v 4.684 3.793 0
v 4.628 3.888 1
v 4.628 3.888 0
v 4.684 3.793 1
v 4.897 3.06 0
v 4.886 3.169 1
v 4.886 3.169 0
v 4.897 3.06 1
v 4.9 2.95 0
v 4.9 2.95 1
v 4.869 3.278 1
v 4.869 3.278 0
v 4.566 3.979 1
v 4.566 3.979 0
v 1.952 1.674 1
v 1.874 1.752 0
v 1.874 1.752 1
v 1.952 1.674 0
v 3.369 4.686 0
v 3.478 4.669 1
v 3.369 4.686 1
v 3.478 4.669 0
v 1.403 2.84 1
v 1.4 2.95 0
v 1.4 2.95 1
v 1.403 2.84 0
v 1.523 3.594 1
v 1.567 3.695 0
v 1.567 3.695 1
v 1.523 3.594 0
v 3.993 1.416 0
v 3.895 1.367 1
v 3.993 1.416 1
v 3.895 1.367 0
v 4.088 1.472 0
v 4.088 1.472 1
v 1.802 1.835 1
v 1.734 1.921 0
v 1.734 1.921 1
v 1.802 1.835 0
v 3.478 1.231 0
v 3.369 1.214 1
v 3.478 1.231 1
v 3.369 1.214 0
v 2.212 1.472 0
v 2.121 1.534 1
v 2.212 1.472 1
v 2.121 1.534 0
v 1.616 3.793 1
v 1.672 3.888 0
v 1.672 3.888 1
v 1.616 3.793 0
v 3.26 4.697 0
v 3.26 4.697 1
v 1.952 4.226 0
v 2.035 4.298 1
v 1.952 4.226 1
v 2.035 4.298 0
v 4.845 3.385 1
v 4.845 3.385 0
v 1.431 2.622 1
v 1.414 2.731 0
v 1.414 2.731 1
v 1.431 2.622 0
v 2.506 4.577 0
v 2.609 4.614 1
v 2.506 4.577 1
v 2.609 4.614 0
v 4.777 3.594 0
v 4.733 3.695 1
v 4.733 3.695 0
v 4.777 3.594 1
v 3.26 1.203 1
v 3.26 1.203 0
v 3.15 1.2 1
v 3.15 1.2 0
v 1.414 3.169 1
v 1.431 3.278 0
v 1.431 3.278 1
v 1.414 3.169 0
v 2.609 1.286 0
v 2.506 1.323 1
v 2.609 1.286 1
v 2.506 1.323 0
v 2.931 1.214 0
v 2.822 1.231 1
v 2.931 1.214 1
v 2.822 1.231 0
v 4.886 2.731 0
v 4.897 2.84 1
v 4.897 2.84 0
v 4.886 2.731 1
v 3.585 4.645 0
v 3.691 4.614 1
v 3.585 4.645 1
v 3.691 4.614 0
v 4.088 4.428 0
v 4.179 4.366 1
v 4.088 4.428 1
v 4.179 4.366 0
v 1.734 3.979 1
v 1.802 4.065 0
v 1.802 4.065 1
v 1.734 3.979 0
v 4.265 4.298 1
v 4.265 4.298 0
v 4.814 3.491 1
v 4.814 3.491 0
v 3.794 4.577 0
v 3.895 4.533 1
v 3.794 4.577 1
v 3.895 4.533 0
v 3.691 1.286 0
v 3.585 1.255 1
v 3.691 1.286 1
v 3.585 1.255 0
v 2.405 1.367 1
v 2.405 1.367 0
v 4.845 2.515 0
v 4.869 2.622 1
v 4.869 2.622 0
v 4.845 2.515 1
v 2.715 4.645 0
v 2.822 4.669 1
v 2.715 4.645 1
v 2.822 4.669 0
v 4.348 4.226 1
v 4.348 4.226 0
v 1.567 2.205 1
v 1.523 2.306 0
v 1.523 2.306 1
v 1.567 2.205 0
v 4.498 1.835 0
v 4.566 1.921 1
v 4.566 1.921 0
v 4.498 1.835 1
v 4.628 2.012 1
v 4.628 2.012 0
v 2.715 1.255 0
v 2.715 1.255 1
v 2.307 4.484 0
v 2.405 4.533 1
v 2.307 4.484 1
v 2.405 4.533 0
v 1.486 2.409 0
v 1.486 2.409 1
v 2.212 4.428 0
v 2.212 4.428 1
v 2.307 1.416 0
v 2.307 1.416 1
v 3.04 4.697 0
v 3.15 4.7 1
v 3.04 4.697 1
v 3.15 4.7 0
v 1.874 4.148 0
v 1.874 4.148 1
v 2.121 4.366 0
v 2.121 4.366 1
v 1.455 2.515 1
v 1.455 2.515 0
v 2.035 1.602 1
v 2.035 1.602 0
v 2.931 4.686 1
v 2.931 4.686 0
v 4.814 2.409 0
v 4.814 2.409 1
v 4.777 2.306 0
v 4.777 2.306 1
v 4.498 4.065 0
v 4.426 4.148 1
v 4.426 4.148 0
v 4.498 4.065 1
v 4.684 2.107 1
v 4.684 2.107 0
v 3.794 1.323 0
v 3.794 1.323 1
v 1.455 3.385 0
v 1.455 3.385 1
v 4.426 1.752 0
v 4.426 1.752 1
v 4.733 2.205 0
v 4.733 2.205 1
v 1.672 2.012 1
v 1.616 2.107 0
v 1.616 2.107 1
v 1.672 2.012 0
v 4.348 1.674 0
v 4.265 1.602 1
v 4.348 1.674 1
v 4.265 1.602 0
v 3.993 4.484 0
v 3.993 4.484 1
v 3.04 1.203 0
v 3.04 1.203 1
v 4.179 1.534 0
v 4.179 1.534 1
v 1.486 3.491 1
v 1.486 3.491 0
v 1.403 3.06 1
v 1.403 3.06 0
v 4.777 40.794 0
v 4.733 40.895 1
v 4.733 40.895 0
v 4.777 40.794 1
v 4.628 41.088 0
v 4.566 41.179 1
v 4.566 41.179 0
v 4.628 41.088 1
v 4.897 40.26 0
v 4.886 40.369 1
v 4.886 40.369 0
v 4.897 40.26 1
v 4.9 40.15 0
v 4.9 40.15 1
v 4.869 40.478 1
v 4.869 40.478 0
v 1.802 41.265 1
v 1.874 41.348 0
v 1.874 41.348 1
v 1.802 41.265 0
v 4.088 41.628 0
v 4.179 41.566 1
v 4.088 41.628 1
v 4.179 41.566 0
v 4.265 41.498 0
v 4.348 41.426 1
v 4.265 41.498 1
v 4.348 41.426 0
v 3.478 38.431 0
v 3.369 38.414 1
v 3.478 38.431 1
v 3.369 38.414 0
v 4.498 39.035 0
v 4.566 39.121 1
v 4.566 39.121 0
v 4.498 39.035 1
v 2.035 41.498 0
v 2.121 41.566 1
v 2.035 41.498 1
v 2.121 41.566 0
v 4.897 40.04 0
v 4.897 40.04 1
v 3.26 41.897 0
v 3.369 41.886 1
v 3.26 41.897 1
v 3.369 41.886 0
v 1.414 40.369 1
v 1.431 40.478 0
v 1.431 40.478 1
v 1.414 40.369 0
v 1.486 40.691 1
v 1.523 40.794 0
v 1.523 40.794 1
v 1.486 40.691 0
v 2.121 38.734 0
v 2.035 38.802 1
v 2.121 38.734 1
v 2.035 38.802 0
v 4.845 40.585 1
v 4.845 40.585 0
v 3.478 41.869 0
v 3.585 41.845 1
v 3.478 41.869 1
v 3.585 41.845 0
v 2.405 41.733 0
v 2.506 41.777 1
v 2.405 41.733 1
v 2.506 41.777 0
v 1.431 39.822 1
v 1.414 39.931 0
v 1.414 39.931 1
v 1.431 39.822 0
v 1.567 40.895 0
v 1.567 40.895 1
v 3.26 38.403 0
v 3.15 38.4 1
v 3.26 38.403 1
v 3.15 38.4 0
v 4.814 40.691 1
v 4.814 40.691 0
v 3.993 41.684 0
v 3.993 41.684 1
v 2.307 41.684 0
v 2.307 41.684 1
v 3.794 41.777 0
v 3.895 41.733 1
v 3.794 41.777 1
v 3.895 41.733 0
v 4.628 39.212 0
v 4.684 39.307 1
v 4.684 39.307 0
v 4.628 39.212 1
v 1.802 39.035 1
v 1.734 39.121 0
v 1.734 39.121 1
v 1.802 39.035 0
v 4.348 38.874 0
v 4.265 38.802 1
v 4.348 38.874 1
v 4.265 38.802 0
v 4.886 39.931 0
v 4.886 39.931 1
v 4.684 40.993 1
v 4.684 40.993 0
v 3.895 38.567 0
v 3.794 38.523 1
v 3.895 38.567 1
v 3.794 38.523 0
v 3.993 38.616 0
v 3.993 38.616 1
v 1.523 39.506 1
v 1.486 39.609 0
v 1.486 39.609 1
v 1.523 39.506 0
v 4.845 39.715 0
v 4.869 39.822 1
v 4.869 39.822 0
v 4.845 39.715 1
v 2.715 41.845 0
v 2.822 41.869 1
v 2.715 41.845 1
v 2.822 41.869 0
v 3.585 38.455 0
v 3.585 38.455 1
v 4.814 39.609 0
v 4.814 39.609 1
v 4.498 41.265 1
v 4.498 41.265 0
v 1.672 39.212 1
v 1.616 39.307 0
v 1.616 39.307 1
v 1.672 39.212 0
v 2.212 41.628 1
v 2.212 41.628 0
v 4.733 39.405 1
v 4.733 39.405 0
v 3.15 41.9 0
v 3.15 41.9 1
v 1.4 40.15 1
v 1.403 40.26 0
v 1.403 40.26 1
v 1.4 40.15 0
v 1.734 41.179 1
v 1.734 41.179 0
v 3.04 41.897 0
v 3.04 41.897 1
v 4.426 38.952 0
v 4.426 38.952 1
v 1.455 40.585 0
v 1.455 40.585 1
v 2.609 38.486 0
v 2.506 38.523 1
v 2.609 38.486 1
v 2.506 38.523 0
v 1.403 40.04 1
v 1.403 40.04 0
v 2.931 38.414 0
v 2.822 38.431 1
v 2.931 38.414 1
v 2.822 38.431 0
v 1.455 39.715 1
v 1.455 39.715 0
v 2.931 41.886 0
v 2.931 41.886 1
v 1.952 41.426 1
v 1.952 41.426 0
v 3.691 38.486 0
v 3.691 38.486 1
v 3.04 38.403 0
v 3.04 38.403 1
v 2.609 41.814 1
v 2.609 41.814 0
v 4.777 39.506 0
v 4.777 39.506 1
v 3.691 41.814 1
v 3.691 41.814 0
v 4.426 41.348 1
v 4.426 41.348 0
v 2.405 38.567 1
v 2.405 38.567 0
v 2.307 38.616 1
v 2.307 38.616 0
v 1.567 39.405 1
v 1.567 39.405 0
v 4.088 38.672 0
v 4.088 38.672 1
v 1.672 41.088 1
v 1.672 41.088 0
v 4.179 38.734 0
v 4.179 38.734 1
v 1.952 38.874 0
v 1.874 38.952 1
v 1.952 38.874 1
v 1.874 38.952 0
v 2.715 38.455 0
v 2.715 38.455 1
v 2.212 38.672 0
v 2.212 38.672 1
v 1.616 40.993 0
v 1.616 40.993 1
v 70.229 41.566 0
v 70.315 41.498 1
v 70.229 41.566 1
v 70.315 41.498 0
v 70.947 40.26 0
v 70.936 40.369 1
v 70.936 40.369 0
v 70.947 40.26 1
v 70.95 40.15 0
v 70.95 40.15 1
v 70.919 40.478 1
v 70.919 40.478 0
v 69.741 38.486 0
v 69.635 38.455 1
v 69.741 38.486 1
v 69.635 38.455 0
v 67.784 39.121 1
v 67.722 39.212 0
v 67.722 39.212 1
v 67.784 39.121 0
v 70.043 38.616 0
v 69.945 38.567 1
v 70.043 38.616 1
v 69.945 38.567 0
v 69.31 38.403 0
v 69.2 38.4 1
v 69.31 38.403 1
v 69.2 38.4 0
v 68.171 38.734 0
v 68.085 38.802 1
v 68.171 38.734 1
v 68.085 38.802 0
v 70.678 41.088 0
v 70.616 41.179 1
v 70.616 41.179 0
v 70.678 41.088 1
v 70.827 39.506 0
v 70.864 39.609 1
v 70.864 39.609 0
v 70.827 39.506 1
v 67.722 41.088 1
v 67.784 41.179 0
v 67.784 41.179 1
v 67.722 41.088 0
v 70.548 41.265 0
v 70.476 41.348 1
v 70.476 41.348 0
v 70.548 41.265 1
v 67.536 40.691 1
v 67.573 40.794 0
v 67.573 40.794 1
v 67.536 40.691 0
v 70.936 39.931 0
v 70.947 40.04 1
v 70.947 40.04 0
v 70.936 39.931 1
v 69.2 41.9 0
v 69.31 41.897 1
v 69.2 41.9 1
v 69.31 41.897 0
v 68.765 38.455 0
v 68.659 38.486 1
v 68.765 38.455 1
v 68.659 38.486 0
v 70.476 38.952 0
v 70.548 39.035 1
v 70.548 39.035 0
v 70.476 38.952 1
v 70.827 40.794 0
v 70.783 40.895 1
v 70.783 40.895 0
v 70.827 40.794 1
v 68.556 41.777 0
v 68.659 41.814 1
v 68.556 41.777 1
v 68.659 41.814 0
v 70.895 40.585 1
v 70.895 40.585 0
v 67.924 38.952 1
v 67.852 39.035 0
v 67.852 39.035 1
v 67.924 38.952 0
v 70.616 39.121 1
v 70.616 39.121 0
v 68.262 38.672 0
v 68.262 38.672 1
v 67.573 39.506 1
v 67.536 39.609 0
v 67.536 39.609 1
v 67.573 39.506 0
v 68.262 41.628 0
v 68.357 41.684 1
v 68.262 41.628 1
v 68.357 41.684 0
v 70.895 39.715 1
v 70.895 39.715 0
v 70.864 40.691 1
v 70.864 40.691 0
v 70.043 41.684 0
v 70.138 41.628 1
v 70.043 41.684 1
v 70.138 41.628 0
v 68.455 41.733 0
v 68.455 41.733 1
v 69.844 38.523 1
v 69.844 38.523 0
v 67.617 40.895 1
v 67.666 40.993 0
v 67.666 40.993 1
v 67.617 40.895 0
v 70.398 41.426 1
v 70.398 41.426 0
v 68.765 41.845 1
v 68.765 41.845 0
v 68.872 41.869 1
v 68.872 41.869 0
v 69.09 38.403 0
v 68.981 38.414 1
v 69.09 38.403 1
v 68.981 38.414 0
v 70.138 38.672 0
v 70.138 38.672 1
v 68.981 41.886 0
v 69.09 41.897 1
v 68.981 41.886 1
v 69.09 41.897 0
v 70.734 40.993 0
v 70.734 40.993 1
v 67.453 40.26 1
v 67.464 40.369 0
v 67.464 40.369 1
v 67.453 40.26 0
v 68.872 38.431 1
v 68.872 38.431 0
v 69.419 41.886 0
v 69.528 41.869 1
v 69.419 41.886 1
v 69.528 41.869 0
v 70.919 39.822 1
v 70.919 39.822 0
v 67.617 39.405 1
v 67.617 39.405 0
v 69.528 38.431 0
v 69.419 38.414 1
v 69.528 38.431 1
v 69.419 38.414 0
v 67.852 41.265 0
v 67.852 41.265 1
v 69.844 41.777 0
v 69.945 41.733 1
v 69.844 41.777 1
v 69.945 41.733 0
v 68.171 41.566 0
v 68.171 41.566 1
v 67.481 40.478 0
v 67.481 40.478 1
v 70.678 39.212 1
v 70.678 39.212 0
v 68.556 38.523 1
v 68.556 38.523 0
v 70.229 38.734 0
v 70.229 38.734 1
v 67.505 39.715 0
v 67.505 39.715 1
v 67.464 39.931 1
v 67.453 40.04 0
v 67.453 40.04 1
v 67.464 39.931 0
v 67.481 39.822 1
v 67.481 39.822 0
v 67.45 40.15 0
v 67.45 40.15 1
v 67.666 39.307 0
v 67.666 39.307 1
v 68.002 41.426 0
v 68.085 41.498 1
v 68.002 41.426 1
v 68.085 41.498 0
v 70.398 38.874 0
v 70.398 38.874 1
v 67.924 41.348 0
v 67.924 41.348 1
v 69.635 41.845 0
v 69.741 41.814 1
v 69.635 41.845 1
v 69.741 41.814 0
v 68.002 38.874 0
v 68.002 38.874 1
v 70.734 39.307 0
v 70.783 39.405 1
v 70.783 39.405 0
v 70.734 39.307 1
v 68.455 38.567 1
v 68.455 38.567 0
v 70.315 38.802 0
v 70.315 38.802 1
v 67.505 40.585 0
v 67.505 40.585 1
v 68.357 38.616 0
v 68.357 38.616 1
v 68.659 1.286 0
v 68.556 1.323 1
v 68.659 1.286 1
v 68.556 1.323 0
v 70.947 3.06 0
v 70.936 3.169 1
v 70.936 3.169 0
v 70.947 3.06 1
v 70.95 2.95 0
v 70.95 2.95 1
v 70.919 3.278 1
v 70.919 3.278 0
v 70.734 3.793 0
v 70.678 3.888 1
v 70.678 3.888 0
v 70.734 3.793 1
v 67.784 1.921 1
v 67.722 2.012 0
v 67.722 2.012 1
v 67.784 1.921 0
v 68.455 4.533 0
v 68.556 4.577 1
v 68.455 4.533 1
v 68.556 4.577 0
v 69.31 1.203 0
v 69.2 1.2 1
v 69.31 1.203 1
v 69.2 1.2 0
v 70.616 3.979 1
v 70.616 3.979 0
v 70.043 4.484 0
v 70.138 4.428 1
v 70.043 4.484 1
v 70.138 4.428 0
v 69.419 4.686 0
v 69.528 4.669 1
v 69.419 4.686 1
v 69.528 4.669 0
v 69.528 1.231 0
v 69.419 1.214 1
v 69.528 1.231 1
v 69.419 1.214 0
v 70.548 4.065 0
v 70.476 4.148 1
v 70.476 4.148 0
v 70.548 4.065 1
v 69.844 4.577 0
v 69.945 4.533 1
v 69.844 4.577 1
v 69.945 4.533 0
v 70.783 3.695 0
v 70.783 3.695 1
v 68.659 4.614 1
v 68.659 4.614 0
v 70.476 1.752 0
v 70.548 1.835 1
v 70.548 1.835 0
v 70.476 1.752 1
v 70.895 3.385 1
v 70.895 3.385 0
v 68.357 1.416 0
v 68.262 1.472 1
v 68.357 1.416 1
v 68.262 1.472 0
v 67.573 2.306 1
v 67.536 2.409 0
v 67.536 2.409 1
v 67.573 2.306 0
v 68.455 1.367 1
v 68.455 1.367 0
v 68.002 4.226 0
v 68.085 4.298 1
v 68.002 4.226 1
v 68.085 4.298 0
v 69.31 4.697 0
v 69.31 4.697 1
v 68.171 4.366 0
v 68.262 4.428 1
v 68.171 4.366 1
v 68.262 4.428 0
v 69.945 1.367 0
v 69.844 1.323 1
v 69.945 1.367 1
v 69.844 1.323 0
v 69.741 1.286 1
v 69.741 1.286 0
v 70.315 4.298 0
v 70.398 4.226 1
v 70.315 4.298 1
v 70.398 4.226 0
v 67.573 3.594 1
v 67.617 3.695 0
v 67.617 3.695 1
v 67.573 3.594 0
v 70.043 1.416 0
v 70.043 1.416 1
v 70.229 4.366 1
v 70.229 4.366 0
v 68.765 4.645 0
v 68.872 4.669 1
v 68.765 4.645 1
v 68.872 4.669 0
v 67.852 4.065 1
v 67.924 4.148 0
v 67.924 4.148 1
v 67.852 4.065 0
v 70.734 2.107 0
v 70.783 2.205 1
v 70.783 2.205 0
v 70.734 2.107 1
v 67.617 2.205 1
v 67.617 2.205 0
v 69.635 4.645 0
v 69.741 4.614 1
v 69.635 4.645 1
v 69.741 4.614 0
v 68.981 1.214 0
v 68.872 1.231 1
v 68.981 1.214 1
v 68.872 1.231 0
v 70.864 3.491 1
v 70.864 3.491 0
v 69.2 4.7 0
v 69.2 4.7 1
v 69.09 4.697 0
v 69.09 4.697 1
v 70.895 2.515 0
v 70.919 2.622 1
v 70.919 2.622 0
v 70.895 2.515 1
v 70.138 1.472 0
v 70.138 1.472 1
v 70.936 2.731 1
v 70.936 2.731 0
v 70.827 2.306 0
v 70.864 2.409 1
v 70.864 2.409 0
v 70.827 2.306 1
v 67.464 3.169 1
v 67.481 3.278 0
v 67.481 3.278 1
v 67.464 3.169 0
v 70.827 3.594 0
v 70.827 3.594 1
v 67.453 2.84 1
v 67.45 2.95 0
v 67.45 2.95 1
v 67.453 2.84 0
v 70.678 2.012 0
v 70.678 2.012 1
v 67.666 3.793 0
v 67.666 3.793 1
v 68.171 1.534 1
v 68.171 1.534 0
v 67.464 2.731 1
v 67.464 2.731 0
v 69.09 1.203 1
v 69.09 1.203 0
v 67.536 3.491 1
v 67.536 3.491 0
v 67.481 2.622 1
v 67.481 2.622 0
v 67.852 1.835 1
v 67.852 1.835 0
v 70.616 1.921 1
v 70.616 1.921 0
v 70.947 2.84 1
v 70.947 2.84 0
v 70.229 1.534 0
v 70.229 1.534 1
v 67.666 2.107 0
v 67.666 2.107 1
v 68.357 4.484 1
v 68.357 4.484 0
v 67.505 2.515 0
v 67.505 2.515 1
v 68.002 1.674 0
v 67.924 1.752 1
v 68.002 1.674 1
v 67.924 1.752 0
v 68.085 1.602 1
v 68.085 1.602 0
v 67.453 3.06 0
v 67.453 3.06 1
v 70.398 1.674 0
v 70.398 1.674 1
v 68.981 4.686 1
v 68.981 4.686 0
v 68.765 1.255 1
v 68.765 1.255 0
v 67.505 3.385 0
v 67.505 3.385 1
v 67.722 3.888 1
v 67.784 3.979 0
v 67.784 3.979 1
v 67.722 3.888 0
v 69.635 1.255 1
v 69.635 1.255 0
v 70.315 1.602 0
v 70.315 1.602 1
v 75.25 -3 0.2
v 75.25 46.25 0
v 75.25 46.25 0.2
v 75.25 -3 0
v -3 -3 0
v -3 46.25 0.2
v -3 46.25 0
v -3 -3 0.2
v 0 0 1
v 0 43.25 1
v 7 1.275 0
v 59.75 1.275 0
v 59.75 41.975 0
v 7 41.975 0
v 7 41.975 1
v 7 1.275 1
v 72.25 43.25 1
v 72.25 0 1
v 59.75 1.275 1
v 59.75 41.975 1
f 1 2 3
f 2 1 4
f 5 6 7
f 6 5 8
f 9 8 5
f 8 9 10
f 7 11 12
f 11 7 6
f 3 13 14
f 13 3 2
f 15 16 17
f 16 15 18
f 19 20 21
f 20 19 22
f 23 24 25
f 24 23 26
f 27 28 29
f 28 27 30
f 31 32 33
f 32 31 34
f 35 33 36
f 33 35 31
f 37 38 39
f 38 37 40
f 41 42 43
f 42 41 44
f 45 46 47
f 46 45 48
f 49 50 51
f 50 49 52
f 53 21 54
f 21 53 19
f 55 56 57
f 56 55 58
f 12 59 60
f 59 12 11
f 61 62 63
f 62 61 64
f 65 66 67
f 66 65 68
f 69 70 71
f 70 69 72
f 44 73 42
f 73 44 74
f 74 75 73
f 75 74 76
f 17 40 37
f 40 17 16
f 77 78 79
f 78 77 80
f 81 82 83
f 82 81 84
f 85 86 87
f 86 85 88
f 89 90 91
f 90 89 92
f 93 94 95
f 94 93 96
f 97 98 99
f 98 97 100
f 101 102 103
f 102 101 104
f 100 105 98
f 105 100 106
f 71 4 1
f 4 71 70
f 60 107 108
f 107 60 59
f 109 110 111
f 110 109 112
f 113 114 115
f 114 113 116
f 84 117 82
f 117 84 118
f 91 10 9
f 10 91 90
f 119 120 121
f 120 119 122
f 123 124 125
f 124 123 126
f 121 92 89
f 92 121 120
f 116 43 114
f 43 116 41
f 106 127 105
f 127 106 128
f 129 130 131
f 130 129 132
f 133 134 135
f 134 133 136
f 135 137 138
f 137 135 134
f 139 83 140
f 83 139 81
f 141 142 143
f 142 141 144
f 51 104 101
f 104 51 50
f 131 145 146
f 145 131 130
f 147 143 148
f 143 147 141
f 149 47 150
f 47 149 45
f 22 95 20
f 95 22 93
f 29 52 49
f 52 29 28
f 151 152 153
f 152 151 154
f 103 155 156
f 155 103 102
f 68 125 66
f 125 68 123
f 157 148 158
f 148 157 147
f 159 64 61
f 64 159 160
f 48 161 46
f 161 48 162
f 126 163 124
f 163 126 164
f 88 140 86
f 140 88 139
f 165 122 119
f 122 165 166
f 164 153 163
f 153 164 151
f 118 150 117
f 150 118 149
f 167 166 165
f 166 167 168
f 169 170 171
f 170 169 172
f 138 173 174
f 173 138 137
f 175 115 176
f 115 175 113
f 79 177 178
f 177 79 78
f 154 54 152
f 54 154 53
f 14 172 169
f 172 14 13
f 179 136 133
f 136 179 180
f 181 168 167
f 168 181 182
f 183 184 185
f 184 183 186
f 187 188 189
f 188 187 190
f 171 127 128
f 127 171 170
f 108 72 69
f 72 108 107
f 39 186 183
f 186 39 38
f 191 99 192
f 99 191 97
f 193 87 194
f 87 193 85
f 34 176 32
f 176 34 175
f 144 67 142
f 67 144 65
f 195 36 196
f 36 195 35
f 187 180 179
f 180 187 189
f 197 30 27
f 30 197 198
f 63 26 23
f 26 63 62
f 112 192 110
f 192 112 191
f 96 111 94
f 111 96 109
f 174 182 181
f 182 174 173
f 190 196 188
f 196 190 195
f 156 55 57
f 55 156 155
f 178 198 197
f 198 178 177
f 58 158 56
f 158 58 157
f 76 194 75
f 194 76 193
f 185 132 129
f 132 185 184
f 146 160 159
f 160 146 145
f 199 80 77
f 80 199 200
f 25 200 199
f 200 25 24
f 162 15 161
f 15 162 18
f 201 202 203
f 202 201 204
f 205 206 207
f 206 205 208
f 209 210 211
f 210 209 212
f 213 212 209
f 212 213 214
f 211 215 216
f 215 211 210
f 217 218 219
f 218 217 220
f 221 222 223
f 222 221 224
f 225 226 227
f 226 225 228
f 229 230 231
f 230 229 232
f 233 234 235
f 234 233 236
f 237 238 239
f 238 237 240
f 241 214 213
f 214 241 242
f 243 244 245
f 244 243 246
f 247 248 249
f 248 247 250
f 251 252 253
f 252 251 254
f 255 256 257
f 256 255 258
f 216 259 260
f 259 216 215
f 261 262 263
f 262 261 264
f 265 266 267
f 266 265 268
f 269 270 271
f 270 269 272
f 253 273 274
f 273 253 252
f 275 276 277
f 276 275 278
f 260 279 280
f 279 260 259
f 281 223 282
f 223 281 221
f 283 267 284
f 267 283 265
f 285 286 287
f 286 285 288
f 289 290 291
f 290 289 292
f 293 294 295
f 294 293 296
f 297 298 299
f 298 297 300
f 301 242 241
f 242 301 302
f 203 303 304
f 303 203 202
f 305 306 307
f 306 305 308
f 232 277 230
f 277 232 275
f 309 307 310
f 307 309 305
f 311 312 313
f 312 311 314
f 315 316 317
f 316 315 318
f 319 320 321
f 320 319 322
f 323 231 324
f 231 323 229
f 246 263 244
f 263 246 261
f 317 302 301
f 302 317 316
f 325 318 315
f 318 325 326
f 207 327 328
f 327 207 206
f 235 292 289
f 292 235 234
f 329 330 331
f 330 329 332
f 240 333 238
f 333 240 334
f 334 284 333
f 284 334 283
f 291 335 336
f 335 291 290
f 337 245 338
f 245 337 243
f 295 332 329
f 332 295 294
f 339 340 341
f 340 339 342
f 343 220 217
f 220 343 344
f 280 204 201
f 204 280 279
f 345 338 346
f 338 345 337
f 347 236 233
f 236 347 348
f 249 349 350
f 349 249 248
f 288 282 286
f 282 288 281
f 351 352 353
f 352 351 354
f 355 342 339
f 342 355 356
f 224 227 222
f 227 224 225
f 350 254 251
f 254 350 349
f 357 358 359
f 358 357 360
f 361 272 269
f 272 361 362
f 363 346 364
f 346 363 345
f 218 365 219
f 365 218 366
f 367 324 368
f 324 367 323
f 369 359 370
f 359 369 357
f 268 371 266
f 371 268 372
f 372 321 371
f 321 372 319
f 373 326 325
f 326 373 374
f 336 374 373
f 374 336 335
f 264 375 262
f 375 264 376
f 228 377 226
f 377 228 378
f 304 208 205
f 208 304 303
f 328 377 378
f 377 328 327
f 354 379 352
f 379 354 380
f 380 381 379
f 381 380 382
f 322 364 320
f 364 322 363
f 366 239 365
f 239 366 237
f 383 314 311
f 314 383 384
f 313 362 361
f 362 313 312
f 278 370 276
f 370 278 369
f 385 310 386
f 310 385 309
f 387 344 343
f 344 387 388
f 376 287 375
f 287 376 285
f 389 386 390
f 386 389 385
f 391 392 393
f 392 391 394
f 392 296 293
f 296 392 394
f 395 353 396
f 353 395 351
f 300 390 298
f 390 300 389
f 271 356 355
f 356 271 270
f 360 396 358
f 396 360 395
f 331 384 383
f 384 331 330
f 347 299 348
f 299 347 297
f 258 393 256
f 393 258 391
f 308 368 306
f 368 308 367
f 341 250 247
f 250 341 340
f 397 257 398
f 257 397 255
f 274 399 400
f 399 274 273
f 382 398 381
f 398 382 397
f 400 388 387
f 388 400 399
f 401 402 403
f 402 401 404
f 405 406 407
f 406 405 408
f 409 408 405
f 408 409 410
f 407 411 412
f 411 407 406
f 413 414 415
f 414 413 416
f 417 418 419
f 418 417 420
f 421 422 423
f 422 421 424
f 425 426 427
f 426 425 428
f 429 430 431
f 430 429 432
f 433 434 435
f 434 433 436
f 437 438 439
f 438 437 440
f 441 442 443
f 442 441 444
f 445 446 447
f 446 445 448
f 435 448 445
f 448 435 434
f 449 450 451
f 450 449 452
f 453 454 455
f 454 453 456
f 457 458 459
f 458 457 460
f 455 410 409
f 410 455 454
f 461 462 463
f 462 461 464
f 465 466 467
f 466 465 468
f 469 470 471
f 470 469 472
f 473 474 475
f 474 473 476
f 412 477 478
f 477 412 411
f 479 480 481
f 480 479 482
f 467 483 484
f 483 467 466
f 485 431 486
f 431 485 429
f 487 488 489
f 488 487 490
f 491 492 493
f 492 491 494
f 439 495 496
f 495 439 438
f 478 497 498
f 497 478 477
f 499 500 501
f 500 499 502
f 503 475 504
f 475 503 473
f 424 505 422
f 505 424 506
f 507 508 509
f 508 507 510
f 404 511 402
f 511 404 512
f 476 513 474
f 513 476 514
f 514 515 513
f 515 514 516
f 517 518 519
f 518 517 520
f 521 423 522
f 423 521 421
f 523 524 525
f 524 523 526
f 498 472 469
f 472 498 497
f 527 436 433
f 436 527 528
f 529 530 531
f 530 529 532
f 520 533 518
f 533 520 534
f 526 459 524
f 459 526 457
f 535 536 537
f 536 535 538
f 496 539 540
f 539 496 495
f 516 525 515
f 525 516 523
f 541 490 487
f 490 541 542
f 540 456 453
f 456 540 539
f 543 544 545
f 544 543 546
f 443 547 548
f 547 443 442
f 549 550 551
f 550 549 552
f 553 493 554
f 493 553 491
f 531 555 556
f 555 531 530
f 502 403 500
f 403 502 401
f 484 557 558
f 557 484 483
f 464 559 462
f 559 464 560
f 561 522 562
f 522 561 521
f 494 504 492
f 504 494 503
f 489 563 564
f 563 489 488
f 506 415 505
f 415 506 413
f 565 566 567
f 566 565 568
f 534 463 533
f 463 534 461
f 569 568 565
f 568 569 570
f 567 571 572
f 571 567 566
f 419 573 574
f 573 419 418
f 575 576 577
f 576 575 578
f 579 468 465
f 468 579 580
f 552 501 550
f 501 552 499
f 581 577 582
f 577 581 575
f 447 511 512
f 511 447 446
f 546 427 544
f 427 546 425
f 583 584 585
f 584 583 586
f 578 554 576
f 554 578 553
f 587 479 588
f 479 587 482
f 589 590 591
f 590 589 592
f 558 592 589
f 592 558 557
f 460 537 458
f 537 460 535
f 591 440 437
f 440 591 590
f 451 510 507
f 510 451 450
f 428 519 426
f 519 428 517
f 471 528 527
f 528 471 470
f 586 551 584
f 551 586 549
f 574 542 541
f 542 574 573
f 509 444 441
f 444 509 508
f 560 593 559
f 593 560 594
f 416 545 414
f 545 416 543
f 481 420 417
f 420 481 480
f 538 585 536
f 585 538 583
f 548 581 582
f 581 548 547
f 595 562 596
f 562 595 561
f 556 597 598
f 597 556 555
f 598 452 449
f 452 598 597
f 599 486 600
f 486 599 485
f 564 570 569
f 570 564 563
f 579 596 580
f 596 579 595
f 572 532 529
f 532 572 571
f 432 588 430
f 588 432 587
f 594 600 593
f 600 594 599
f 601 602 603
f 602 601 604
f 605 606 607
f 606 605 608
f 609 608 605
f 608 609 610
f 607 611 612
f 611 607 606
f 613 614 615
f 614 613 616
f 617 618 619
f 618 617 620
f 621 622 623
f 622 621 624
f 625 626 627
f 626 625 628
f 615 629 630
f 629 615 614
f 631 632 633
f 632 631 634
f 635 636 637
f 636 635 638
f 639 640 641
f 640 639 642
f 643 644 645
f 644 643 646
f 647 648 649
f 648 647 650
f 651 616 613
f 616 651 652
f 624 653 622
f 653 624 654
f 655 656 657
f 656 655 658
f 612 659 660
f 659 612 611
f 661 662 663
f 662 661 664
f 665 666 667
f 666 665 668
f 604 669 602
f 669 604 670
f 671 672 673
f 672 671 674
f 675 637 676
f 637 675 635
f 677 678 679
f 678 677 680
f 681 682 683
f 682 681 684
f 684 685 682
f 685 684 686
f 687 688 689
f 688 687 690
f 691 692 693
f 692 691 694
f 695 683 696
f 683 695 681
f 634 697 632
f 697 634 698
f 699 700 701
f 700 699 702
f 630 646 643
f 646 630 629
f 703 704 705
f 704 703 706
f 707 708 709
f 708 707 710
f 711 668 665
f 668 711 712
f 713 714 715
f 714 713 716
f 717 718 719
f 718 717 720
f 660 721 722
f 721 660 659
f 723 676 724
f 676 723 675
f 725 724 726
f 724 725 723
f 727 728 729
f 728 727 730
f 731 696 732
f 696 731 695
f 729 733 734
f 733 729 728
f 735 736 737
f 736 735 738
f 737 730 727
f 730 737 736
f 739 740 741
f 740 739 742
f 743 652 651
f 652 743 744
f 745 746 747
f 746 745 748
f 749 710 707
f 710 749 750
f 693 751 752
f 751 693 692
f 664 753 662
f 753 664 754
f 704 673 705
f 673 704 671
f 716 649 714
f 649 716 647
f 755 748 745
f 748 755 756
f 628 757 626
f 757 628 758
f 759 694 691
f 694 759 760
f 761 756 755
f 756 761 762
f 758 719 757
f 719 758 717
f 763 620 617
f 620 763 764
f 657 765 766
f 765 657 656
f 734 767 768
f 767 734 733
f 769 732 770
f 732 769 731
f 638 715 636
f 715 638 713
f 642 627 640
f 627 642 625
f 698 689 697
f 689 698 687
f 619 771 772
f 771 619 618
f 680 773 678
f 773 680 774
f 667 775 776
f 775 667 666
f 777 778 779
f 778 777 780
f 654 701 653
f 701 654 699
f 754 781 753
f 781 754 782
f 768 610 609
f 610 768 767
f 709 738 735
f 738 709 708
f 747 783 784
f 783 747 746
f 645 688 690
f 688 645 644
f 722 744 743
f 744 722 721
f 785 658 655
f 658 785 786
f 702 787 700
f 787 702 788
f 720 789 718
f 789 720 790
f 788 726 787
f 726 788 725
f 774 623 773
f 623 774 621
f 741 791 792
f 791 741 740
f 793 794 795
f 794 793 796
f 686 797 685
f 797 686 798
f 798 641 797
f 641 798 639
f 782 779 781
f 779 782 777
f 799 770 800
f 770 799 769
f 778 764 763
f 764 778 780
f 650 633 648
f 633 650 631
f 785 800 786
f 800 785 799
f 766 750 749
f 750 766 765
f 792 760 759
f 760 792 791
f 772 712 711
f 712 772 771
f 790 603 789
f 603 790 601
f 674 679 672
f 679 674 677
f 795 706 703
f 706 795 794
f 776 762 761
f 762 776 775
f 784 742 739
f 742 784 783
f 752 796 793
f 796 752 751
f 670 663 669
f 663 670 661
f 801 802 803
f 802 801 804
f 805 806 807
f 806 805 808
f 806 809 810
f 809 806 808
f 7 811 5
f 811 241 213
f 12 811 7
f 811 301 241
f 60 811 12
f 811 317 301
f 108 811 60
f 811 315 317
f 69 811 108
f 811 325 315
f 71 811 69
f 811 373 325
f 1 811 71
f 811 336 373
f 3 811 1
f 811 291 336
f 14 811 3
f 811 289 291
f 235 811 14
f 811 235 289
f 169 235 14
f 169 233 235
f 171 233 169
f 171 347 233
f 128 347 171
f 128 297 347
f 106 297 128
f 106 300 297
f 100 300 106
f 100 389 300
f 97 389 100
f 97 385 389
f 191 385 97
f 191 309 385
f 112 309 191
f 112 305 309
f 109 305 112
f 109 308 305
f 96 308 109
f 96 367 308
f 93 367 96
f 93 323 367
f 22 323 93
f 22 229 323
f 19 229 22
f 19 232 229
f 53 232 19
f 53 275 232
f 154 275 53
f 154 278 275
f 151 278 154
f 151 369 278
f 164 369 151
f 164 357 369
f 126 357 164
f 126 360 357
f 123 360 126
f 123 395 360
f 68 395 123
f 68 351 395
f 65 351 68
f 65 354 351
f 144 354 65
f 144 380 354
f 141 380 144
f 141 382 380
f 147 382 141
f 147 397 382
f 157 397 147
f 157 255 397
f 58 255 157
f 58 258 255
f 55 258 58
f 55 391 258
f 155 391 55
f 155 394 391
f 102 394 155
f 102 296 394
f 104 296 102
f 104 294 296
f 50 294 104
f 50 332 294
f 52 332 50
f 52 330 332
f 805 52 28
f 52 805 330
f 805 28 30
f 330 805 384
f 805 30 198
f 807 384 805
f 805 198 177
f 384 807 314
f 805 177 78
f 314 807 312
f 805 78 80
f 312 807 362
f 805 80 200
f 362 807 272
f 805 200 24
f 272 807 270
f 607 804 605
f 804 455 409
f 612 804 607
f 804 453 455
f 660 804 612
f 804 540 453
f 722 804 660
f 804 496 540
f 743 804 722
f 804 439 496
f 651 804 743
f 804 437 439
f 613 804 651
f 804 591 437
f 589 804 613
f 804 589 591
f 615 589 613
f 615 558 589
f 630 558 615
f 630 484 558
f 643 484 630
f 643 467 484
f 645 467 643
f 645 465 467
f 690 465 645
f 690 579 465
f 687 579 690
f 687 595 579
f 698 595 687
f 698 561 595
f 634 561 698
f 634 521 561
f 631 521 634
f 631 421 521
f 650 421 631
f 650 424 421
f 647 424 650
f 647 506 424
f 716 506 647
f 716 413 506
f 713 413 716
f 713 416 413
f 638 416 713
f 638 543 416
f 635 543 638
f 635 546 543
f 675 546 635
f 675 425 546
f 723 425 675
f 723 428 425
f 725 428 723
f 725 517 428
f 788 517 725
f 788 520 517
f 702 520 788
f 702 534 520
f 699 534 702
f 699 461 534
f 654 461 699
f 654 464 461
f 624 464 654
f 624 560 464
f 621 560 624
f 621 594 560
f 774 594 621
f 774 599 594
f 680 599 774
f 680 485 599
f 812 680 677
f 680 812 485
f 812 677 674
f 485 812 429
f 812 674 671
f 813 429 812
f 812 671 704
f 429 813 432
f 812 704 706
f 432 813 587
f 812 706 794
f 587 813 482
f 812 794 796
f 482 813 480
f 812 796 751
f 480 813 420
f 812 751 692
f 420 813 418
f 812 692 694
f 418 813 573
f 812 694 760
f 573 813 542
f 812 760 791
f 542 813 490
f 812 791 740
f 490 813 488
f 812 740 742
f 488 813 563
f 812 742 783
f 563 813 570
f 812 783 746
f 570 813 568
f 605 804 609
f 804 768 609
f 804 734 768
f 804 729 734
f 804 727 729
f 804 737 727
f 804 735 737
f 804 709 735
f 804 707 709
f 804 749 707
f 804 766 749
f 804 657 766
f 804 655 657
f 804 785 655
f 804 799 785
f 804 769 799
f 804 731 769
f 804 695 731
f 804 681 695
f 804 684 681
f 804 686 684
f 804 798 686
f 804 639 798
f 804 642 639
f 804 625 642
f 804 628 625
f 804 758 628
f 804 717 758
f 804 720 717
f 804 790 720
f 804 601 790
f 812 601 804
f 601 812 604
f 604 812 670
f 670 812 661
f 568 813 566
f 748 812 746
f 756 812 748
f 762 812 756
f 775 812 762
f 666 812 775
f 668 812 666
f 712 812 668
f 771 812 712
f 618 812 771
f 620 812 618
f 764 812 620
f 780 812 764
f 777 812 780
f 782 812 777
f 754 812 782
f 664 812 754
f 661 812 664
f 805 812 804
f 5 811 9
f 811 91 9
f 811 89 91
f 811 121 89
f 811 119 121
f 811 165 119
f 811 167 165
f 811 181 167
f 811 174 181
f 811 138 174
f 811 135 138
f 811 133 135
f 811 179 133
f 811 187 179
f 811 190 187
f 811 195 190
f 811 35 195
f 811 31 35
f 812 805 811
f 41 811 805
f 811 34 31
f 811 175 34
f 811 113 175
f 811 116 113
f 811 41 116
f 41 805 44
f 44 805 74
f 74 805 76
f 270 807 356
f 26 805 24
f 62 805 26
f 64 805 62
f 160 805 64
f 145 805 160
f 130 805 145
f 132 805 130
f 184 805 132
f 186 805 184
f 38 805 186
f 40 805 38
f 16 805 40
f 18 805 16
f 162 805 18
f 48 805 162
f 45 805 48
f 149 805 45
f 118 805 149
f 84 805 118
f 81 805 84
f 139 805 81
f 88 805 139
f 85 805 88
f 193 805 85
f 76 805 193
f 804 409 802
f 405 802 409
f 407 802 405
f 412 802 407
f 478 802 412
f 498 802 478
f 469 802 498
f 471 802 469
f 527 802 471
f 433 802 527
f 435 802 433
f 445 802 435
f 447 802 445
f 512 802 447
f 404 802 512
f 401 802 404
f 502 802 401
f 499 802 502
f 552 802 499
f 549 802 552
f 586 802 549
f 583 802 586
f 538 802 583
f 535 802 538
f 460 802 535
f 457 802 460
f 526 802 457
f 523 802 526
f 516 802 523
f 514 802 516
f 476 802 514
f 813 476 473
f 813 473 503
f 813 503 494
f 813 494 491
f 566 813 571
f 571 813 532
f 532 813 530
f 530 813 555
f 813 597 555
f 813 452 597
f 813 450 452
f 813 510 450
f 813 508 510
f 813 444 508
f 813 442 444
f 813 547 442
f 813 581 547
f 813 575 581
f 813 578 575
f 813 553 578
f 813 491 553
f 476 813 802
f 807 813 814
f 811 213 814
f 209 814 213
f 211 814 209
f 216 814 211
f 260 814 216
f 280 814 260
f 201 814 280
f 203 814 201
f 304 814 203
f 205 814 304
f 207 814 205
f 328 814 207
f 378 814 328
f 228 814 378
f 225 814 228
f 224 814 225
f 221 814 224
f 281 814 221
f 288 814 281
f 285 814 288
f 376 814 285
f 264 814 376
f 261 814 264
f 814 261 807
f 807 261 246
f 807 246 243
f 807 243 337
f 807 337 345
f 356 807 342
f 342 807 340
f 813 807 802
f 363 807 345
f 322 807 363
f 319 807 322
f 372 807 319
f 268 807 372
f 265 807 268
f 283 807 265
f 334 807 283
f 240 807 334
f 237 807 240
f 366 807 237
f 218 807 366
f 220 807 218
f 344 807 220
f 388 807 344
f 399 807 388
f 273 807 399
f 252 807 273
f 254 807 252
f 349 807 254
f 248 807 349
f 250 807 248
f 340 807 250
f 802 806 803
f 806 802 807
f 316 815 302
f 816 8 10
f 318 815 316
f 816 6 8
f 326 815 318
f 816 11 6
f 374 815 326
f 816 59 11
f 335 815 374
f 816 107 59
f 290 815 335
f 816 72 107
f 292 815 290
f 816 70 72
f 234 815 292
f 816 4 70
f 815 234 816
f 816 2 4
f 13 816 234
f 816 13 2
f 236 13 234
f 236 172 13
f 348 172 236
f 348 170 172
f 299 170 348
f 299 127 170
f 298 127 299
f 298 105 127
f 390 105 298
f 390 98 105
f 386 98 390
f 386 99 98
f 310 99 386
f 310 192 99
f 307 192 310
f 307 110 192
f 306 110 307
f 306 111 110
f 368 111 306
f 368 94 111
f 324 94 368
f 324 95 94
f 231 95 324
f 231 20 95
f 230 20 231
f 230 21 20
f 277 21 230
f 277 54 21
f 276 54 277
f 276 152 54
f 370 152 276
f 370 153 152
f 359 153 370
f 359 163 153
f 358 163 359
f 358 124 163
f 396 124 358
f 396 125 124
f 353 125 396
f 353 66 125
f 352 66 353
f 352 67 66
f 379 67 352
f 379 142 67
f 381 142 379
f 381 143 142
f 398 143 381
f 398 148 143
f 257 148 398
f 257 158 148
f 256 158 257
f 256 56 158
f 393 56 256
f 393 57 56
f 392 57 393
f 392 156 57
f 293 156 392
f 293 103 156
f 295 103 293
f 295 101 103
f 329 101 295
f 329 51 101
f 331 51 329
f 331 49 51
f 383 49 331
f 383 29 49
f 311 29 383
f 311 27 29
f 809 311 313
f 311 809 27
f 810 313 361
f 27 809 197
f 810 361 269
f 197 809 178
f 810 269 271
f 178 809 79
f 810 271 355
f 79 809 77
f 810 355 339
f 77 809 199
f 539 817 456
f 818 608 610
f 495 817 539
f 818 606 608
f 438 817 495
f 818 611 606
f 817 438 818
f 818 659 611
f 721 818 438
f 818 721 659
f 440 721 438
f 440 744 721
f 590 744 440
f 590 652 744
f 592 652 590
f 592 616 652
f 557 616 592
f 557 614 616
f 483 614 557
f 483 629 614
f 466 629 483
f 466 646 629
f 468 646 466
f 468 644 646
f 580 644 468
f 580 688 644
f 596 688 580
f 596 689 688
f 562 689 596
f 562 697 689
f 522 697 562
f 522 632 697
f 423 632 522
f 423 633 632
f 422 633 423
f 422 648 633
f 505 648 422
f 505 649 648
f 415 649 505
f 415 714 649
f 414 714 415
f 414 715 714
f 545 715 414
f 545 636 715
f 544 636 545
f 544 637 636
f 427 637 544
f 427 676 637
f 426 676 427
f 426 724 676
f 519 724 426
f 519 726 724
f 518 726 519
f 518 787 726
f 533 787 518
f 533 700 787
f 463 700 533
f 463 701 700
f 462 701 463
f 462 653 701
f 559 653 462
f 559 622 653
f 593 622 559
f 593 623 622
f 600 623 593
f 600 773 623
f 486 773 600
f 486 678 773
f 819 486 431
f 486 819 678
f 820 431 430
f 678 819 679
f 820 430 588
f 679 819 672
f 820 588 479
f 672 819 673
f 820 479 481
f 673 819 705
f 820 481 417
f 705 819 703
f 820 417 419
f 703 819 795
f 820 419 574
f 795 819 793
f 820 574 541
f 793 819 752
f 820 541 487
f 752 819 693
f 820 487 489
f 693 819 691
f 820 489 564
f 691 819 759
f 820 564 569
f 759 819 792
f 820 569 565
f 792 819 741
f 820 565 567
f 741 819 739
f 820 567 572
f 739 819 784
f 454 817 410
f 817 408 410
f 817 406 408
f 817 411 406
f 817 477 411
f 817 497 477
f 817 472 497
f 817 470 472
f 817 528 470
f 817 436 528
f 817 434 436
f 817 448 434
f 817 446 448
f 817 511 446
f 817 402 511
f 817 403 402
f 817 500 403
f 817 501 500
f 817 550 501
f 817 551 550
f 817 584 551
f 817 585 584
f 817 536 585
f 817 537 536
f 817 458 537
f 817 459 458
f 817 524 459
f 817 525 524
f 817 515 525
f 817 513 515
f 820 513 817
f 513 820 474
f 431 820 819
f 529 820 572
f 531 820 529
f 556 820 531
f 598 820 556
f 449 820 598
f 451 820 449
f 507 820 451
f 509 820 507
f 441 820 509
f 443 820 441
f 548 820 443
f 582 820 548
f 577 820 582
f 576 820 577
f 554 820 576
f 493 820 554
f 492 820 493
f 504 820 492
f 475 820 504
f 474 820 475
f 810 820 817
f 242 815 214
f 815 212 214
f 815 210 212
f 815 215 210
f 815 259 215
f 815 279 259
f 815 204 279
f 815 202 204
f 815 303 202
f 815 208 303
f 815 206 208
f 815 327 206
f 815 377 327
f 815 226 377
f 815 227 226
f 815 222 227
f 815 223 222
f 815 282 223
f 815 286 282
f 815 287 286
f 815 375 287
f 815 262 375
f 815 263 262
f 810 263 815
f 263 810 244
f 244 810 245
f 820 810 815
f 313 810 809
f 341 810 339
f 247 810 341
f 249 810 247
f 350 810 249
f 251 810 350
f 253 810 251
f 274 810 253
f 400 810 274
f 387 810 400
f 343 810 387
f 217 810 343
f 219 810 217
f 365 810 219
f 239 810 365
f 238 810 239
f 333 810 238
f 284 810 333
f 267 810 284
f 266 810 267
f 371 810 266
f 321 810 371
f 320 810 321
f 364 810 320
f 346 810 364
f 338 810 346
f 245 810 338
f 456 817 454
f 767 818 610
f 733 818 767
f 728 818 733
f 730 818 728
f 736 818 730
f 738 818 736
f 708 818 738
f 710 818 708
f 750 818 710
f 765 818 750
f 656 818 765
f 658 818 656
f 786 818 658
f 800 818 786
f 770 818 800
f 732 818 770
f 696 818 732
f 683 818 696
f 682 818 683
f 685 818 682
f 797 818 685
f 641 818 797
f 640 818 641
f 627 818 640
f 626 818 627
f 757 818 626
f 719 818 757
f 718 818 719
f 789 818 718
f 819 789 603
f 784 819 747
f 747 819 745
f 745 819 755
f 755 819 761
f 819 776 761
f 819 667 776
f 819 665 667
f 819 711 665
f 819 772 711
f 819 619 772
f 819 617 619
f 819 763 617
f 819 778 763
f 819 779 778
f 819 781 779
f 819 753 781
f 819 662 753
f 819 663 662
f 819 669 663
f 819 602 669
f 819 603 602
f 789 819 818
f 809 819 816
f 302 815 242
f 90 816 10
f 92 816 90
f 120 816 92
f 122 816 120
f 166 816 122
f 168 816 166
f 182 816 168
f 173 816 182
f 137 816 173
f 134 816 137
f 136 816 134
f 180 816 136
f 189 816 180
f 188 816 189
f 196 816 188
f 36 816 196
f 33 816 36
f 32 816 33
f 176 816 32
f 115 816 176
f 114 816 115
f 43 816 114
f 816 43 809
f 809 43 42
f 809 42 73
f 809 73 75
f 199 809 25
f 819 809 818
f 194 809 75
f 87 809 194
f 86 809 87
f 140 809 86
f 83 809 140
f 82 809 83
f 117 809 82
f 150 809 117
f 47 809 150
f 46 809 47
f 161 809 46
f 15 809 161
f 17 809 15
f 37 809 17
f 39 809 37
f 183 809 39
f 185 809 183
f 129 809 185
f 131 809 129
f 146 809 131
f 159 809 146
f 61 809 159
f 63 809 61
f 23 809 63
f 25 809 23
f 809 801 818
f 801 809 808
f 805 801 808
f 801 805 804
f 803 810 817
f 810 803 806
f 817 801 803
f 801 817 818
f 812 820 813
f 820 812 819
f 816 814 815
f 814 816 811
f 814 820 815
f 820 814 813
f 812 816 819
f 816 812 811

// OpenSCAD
// file: ../libraries/commons.scad
/**
 * forEachCoord
 * Wrapper to apply child on each element
 */
module forEachCoord(coords_list) {
    for (coords = coords_list)
        translate(
            [
                coords[0] == undef ? 0 : coords[0],
                coords[1] == undef ? 0 : coords[1],
                coords[2] == undef ? 0 : coords[2],
            ]
        )
            children();
}
// file: ../enveloppes/screenEnveloppe.scad
include <../assets/lcd-screen/configurations.scad>

use <../libraries/commons.scad>

/**
 * screenFixationThrows
 * @name screenFixationThrows
 * @description screenFixationThrows
 * @type enveloppe
 * @parent root
 */
module screenFixationThrows(
    electronic_board_x_size = screen_asset_electronic_board_x_size,
    electronic_board_y_size = screen_asset_electronic_board_y_size,
    x_margin_left = screen_asset_x_margin_throws_left,
    x_margin_right = screen_asset_x_margin_throws_right,
    y_margin_top = screen_asset_y_margin_throws_top,
    y_margin_bottom = screen_asset_y_margin_throws_bottom,
    throw_diameter = 3.1,
    $fn = $fn
) {

    throws_z_size = 20;

    offset_coords_throw_list = [
        [
            x_margin_left,
            y_margin_bottom,
        ],
        [
            x_margin_left,
            electronic_board_y_size - y_margin_top,
        ],
        [
            electronic_board_x_size - x_margin_right,
            electronic_board_y_size - y_margin_top,
        ],
        [
            electronic_board_x_size - x_margin_right,
            y_margin_bottom,
        ]
    ];

    // Fixations throws
    translate([0,0, -throws_z_size / 2])
        forEachCoord(offset_coords_throw_list)
            cylinder(h = throws_z_size, d = throw_diameter, center = false, $fn = $fn);
}


/**
 * screenMainThrow
 * @name screenMainThrow
 * @description screenMainThrow
 * @type enveloppe
 * @parent root
 */
module screenMainThrow(
    electronic_board_x_size = screen_asset_electronic_board_x_size,
    electronic_board_y_size = screen_asset_electronic_board_y_size,
    screen_external_x_size = screen_asset_screen_external_x_size,
    screen_external_y_size = screen_asset_screen_external_y_size,
    screen_throw_x_margin = 2.8,
    screen_throw_y_margin = 0.5
) {

    throws_z_size = 20;

    // Main screen throw
    translate([
        (electronic_board_x_size - screen_external_x_size) / 2 - screen_throw_x_margin,
        (electronic_board_y_size - screen_external_y_size) / 2 - screen_throw_y_margin,
        -throws_z_size / 2
    ])
        cube(
            [
                screen_external_x_size + (screen_throw_x_margin * 2),
                screen_external_y_size + (screen_throw_y_margin * 2),
                throws_z_size,
            ]
        );
}

/**
 * screenConnectorThrow
 * @name screenConnectorThrow
 * @description screenConnectorThrow
 * @type enveloppe
 * @parent root
 */
module screenConnectorThrow(
    electronic_board_y_size = screen_asset_electronic_board_y_size
) {
    throws_z_size = 20;

    translate(
        [
            0.85 - (0.5 / 2),
            11.3,
            -throws_z_size / 2
        ]
    )
        cube(
            [
                2.5 + 0.5,
                electronic_board_y_size - (11.3 * 2),
                throws_z_size
            ]
        );
}

/**
 * sceenVisibleZoneCube
 * @name sceenVisibleZoneCube
 * @description sceenVisibleZoneCube
 * @type enveloppe
 * @parent root
 */
module sceenVisibleZoneCube(
    x_margin = 0,
    y_margin = 0,
    z_size = 0,

    electronic_board_x_size = screen_asset_electronic_board_x_size,
    electronic_board_y_size = screen_asset_electronic_board_y_size,
    screen_external_x_size = screen_asset_screen_external_x_size,
    screen_external_y_size = screen_asset_screen_external_y_size,
) {

    translate([
        (electronic_board_x_size - screen_external_x_size) / 2 + 1 - x_margin,
        (electronic_board_y_size - screen_external_y_size) / 2 + 1 - y_margin,
        0
    ])
        cube(
            [
                screen_external_x_size - 1 - 6.5 + (x_margin * 2),
                screen_external_y_size - 1 - 1 + (y_margin * 2),
                z_size,
            ]
        );
}

sceenVisibleZoneCube();
// file: ../configurations/global.scad
housing_facades_throws_diameter = 3.8;

// external size
case_external_x_size = 90;
case_external_y_size = 140;
case_external_z_size = 38;
case_external_panes_thickness = 4.8;

facade_front_round_edges_radius = 5;
facade_throws_margin = 5;

facade_front_fixation_throws_diameter = housing_facades_throws_diameter;

// facade corners
facade_corners_offset_lenght = 9;
facade_corners_main_x_size = 19;
facade_corners_main_y_size = 19;
facade_corners_main_thickness = 11;
facade_corners_correction_offset_length = 0.2;
facade_corners_correction_offset_thickness = 0.0;
facade_fn = 100;


facade_controller_coords = [
    case_external_x_size / 2,
    case_external_y_size / 2 - 30,
];


// Screen frames
screen_frame_electronic_board_margin = 3;
screen_frame_throw_diameter = 3.5;
screen_frame_piece_z_size = 1.5;
screen_frame_piece_glass_embedding_margin = 1;
screen_frame_piece_glass_embedding_z_depth = 1;
screen_frame_facade_piece_z_size = 1;
screen_frame_fn = 100;

screen_glass_visible_zone_x_margin = 0.7;
screen_glass_visible_zone_y_margin = 0.7;
screen_glass_z_size = 1;

facade_screen_coords = [
    case_external_x_size / 2,
    case_external_y_size / 2 + 28,
];


// Generics
insert_throw_diameter = 4.2;
insert_throw_length = 6 + 2;


// Controller facade
controller_breadboard_x_size_point = 28;
controller_breadboard_y_size_point = 9;

controller_facade_z_size = 2;
controller_facade_button_throw_margin = 1;
controller_facade_small_button_throw_margin = 0.5;
controller_facade_a_b_button_throw_margin = 0.5;

controller_facade_border_rounded_border_1 = 5;
controller_facade_border_rounded_border_2 = 4;

controller_facade_with_border_x_size = 82;
controller_facade_with_border_y_size = 47;

controller_facade_border_throws_margin = 5;
controller_braidboard_throw_margin = 1;

controller_facade_border_fn = 80;


// Cross Button
controller_cross_button_x_y_size = 20;
controller_cross_button_z_size = 4;
controller_cross_button_thickness = 6;
controller_cross_button_round_edges_radius = 1;
controller_cross_button_support_x_y_size = 22;
controller_cross_button_support_z_size = 1;
controller_cross_button_fn = 150;


// A and B Buttons
controller_a_b_button_diameter = 7.5;
controller_a_b_button_z_size = 4;
controller_a_b_button_support_diameter = 9.5;
controller_a_b_button_support_z_size = 1;
controller_a_b_button_fn = 80;


// small Buttons
controller_small_button_diameter = 5.5;
controller_small_button_z_size = 3;
controller_small_button_support_diameter = 7.5;
controller_small_button_support_z_size = 1;
controller_small_button_fn = 80;

// Directional cross
controller_directional_cross_points_coords = [6, 5];
controller_start_button_points_coords = [14, 3];
controller_select_button_points_coords = [18, 3];
controller_menu_button_points_coords = [14, 7];
controller_option_button_points_coords = [18, 7];
controller_a_button_points_coords = [23, 4];
controller_b_button_points_coords = [27, 6];
controller_bolt_throws_list = [
    [2, 2],
    [2, 8],
    [10, 2],
    [10, 8],
    [27, 2],
    [23, 8],
];


// usb charger holder
usb_charger_support_total_x_size = 17.57 + 15;
usb_charger_support_total_y_size = 12;
usb_charger_support_total_z_size = 2;


usb_charger_fixation_support_z_size = 4.5;
usb_charger_encaps_x_size = 17.57 + 1;
usb_charger_encaps_y_size = 27.85 + 1;
usb_charger_encaps_z_size = 1;

usb_charger_facade_x_fixation_spacing = 42;
usb_charger_facade_y_size = 1.36;
usb_charger_facade_z_size = 14;

usb_charger_throw_diameter = 3.5;
usb_charger_facade_holder_z_offset = 3.5; //
usb_charger_fixation_facade_y_margin = 0.5;
usb_charger_throw_offset_y = 4.5;
usb_charger_throw_offset_x = 3.5;
usb_charger_facade_fn = 100;

usb_charger_external_facade_main_throw_margin = 2;
usb_charger_external_facade_main_throw_diameter = housing_facades_throws_diameter;

usb_charger_coords = [
    28, 15
];


facade_top_on_off_button_throw_diameter = 12.8;

facade_top_on_off_button_coords = [
    case_external_x_size / 2 + 18,
    case_external_z_size / 2
];


// Bolt join Piece Mother board
bolt_join_mother_board_internal_diameter = 3.5;
bolt_join_mother_board_external_diameter = 3.5 + (0.4 * 6);
bolt_join_mother_board_height = 3;

// Bolt join Piece GamePadController
bolt_join_game_pad_internal_diameter = 3.5;
bolt_join_game_pad_external_diameter = 3.5 + (0.4 * 6);
bolt_join_game_pad_height = 6.5;

bolt_join_fn = 500;


// Mother board breadboard
mother_board_x_size_point = 25;
mother_board_y_size_point = 32;

mother_board_coords = [
    case_external_x_size / 2 - ((mother_board_x_size_point + 1) * 2.54) / 2,
    44,
    3
];

mother_board_bolt_throws_list = [
    [3, 2],
    [3, 17],
    [23, 2],
    [23, 17],
];


// Speaker
speaker_facade_throw_diameter = 28 + 1;
speaker_facade_z_size = 1.36;
speaker_facade_rounded_radius = 5;
// file: ../assets/lcd-screen/configurations.scad
screen_asset_electronic_board_x_size = 72.25;
screen_asset_electronic_board_y_size = 43.25;
screen_asset_electronic_board_z_size = 1.25;

screen_asset_screen_external_x_size = 60.25;
screen_asset_screen_external_y_size = 42.7;
screen_asset_screen_external_z_size = 4 - 1.25;

screen_asset_throw_diameter = 3.1;

screen_asset_x_margin_throws_left = 1.6 + 1.55;
screen_asset_x_margin_throws_right = 1.5 + 1.55;
screen_asset_y_margin_throws_top = 1.55 + 1.55;
screen_asset_y_margin_throws_bottom = 1.4 + 1.55;
// main file
include <../assets/lcd-screen/configurations.scad>
include <../configurations/global.scad>

use <../enveloppes/screenEnveloppe.scad>

/**
 * screenFrameFacadePiece
 * @name screenFrameFacadePiece
 * @description Piece 3D Prined
 * @type piece
 * @parent screenComponent
 */
module screenFrameFacadePiece(
    electronic_board_x_size = screen_asset_electronic_board_x_size,
    electronic_board_y_size = screen_asset_electronic_board_y_size,

    screen_frame_electronic_board_margin = screen_frame_electronic_board_margin,
    screen_frame_z_size = screen_frame_facade_piece_z_size,
    throw_diameter = screen_frame_throw_diameter,
    $fn = screen_frame_fn
) {

    left_margin = screen_frame_electronic_board_margin;
    right_margin = screen_frame_electronic_board_margin;
    top_margin = screen_frame_electronic_board_margin;
    bottom_margin = screen_frame_electronic_board_margin;

    throws_z_size = 20;

    bottom_part_z = 0.2;
    top_part_z = 0.1;
    top_part_throws_x_y_margin = 0;

    difference() {
        hull() {
            translate([-left_margin, -bottom_margin, 0])
                cube(
                    [
                        electronic_board_x_size + left_margin + right_margin,
                        electronic_board_y_size + top_margin + bottom_margin,
                        bottom_part_z
                    ]
                );

            translate([
                -top_part_throws_x_y_margin,
                -top_part_throws_x_y_margin,
                screen_frame_z_size - top_part_z
            ])
                cube(
                    [
                        electronic_board_x_size + top_part_throws_x_y_margin * 2,
                        electronic_board_y_size + top_part_throws_x_y_margin * 2,
                        top_part_z
                    ]
                );
        }

        translate([0,0, -throws_z_size / 2])
            sceenVisibleZoneCube(
                z_size = throws_z_size
            );

        screenFixationThrows(
            throw_diameter = throw_diameter,
            $fn = $fn
        );        
    }
}

/**
 * @stl
 * @png
 * @colorscheme BeforeDawn
 * @view axes,scales
 */
screenFrameFacadePiece();
